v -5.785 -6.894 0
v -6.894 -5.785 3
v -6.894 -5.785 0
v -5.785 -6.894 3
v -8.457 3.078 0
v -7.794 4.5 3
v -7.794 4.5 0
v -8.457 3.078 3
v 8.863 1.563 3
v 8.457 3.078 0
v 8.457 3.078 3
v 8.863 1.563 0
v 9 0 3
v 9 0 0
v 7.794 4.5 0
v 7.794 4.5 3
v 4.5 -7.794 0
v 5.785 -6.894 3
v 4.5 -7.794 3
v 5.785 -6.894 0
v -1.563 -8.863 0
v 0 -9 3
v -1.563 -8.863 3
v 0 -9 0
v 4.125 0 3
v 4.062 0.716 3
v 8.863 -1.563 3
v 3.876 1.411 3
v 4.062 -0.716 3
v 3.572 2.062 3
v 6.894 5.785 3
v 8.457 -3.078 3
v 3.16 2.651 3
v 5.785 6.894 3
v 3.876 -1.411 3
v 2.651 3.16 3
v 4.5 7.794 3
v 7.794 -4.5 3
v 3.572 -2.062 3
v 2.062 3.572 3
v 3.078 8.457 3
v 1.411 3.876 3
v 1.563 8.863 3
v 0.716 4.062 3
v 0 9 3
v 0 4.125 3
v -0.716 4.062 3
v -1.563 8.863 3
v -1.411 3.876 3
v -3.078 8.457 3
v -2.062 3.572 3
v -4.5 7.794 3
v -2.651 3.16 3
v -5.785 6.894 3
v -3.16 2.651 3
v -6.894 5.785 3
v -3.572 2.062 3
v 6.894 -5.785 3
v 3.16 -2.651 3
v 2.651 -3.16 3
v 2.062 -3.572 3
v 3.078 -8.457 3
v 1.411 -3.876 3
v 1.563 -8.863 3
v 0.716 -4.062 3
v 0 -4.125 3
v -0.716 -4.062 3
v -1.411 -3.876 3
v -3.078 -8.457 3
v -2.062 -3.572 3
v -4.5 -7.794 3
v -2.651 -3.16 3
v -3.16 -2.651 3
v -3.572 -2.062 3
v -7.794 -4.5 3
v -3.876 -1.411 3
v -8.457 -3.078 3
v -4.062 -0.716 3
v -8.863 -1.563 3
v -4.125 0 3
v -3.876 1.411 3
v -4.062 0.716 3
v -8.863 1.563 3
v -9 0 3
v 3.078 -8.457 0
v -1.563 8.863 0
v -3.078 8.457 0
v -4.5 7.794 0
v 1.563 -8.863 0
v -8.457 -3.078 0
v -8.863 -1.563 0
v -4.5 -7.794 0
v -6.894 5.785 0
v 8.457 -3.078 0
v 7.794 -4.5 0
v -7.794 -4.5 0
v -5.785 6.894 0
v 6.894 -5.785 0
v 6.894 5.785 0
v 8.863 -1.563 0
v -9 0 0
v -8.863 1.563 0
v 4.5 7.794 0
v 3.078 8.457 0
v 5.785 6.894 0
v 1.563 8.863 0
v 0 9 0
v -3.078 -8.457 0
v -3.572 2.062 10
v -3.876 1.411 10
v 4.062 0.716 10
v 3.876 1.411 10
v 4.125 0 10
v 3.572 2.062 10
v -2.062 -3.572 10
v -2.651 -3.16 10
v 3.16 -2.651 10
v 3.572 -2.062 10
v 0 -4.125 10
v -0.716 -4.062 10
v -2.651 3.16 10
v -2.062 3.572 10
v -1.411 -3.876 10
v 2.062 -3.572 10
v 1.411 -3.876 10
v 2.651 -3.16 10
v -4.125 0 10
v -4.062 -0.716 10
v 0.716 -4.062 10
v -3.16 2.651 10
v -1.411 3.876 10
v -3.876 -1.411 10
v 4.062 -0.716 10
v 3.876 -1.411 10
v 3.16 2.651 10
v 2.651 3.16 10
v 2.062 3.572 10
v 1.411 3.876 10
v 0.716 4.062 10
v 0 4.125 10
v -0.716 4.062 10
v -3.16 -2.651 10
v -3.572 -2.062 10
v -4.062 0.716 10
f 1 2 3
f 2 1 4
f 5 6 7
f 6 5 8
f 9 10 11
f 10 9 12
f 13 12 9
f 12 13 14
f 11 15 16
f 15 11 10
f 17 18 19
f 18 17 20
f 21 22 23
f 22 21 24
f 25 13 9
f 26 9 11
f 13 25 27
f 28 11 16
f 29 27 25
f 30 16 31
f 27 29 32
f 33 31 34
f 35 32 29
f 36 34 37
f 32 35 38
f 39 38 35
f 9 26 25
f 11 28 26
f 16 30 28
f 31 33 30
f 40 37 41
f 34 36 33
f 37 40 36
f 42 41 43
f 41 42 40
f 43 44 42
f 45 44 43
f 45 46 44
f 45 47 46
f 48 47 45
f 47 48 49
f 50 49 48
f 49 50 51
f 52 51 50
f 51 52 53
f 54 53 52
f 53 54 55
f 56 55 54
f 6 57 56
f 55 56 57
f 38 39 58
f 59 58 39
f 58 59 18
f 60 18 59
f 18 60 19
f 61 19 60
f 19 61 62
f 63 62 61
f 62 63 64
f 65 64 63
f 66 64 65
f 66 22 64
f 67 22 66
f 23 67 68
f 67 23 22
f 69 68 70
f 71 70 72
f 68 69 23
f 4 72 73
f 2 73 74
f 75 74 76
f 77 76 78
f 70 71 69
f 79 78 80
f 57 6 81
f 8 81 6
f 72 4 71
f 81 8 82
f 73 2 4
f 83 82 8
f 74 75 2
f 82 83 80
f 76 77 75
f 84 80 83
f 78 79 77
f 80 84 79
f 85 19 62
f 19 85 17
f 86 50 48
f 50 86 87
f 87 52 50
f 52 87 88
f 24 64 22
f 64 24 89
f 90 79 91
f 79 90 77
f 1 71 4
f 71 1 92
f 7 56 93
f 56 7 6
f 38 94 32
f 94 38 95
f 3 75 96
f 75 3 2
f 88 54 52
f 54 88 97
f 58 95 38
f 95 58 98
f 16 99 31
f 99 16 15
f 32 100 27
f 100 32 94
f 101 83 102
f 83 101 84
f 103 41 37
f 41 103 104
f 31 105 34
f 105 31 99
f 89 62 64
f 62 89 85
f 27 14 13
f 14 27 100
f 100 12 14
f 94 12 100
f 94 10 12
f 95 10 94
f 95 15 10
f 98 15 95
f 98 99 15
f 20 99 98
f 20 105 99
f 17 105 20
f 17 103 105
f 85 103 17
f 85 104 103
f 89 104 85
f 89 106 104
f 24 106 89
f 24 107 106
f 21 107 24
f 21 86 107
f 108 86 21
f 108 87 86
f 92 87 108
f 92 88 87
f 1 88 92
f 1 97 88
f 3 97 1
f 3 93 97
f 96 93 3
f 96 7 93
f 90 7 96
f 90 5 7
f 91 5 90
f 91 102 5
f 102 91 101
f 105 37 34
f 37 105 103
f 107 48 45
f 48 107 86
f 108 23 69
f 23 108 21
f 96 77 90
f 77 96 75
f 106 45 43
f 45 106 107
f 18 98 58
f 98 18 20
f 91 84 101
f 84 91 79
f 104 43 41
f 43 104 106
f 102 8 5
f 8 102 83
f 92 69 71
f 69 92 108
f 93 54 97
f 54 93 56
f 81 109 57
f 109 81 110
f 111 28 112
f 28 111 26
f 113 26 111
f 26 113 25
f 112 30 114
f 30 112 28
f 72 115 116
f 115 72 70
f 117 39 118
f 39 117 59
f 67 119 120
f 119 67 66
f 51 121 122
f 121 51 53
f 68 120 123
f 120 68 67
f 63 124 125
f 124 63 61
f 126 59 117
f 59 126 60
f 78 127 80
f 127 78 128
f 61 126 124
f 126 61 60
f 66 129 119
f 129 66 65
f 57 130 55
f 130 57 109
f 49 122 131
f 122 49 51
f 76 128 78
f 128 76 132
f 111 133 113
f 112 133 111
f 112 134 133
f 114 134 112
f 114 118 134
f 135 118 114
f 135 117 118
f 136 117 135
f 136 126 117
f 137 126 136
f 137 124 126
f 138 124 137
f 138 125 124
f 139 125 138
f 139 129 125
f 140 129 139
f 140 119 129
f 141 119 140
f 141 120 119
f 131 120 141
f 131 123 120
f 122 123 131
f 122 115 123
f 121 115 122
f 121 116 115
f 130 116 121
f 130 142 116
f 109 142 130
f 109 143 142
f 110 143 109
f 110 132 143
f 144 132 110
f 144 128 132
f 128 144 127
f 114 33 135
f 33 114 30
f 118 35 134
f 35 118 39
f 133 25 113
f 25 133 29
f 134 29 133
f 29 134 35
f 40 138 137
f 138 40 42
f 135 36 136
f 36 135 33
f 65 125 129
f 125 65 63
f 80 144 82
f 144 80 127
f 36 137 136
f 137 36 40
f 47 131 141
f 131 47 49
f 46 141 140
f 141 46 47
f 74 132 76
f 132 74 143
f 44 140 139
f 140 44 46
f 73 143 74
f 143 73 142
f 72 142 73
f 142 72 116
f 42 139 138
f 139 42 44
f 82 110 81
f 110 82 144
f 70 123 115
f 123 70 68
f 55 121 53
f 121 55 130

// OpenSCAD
disky = 3;
diskd = 18;
posty = 10;
postd = 8.25;

$fn = 36;

cylinder(h=disky, d=diskd);
cylinder(h=posty, d=postd);
